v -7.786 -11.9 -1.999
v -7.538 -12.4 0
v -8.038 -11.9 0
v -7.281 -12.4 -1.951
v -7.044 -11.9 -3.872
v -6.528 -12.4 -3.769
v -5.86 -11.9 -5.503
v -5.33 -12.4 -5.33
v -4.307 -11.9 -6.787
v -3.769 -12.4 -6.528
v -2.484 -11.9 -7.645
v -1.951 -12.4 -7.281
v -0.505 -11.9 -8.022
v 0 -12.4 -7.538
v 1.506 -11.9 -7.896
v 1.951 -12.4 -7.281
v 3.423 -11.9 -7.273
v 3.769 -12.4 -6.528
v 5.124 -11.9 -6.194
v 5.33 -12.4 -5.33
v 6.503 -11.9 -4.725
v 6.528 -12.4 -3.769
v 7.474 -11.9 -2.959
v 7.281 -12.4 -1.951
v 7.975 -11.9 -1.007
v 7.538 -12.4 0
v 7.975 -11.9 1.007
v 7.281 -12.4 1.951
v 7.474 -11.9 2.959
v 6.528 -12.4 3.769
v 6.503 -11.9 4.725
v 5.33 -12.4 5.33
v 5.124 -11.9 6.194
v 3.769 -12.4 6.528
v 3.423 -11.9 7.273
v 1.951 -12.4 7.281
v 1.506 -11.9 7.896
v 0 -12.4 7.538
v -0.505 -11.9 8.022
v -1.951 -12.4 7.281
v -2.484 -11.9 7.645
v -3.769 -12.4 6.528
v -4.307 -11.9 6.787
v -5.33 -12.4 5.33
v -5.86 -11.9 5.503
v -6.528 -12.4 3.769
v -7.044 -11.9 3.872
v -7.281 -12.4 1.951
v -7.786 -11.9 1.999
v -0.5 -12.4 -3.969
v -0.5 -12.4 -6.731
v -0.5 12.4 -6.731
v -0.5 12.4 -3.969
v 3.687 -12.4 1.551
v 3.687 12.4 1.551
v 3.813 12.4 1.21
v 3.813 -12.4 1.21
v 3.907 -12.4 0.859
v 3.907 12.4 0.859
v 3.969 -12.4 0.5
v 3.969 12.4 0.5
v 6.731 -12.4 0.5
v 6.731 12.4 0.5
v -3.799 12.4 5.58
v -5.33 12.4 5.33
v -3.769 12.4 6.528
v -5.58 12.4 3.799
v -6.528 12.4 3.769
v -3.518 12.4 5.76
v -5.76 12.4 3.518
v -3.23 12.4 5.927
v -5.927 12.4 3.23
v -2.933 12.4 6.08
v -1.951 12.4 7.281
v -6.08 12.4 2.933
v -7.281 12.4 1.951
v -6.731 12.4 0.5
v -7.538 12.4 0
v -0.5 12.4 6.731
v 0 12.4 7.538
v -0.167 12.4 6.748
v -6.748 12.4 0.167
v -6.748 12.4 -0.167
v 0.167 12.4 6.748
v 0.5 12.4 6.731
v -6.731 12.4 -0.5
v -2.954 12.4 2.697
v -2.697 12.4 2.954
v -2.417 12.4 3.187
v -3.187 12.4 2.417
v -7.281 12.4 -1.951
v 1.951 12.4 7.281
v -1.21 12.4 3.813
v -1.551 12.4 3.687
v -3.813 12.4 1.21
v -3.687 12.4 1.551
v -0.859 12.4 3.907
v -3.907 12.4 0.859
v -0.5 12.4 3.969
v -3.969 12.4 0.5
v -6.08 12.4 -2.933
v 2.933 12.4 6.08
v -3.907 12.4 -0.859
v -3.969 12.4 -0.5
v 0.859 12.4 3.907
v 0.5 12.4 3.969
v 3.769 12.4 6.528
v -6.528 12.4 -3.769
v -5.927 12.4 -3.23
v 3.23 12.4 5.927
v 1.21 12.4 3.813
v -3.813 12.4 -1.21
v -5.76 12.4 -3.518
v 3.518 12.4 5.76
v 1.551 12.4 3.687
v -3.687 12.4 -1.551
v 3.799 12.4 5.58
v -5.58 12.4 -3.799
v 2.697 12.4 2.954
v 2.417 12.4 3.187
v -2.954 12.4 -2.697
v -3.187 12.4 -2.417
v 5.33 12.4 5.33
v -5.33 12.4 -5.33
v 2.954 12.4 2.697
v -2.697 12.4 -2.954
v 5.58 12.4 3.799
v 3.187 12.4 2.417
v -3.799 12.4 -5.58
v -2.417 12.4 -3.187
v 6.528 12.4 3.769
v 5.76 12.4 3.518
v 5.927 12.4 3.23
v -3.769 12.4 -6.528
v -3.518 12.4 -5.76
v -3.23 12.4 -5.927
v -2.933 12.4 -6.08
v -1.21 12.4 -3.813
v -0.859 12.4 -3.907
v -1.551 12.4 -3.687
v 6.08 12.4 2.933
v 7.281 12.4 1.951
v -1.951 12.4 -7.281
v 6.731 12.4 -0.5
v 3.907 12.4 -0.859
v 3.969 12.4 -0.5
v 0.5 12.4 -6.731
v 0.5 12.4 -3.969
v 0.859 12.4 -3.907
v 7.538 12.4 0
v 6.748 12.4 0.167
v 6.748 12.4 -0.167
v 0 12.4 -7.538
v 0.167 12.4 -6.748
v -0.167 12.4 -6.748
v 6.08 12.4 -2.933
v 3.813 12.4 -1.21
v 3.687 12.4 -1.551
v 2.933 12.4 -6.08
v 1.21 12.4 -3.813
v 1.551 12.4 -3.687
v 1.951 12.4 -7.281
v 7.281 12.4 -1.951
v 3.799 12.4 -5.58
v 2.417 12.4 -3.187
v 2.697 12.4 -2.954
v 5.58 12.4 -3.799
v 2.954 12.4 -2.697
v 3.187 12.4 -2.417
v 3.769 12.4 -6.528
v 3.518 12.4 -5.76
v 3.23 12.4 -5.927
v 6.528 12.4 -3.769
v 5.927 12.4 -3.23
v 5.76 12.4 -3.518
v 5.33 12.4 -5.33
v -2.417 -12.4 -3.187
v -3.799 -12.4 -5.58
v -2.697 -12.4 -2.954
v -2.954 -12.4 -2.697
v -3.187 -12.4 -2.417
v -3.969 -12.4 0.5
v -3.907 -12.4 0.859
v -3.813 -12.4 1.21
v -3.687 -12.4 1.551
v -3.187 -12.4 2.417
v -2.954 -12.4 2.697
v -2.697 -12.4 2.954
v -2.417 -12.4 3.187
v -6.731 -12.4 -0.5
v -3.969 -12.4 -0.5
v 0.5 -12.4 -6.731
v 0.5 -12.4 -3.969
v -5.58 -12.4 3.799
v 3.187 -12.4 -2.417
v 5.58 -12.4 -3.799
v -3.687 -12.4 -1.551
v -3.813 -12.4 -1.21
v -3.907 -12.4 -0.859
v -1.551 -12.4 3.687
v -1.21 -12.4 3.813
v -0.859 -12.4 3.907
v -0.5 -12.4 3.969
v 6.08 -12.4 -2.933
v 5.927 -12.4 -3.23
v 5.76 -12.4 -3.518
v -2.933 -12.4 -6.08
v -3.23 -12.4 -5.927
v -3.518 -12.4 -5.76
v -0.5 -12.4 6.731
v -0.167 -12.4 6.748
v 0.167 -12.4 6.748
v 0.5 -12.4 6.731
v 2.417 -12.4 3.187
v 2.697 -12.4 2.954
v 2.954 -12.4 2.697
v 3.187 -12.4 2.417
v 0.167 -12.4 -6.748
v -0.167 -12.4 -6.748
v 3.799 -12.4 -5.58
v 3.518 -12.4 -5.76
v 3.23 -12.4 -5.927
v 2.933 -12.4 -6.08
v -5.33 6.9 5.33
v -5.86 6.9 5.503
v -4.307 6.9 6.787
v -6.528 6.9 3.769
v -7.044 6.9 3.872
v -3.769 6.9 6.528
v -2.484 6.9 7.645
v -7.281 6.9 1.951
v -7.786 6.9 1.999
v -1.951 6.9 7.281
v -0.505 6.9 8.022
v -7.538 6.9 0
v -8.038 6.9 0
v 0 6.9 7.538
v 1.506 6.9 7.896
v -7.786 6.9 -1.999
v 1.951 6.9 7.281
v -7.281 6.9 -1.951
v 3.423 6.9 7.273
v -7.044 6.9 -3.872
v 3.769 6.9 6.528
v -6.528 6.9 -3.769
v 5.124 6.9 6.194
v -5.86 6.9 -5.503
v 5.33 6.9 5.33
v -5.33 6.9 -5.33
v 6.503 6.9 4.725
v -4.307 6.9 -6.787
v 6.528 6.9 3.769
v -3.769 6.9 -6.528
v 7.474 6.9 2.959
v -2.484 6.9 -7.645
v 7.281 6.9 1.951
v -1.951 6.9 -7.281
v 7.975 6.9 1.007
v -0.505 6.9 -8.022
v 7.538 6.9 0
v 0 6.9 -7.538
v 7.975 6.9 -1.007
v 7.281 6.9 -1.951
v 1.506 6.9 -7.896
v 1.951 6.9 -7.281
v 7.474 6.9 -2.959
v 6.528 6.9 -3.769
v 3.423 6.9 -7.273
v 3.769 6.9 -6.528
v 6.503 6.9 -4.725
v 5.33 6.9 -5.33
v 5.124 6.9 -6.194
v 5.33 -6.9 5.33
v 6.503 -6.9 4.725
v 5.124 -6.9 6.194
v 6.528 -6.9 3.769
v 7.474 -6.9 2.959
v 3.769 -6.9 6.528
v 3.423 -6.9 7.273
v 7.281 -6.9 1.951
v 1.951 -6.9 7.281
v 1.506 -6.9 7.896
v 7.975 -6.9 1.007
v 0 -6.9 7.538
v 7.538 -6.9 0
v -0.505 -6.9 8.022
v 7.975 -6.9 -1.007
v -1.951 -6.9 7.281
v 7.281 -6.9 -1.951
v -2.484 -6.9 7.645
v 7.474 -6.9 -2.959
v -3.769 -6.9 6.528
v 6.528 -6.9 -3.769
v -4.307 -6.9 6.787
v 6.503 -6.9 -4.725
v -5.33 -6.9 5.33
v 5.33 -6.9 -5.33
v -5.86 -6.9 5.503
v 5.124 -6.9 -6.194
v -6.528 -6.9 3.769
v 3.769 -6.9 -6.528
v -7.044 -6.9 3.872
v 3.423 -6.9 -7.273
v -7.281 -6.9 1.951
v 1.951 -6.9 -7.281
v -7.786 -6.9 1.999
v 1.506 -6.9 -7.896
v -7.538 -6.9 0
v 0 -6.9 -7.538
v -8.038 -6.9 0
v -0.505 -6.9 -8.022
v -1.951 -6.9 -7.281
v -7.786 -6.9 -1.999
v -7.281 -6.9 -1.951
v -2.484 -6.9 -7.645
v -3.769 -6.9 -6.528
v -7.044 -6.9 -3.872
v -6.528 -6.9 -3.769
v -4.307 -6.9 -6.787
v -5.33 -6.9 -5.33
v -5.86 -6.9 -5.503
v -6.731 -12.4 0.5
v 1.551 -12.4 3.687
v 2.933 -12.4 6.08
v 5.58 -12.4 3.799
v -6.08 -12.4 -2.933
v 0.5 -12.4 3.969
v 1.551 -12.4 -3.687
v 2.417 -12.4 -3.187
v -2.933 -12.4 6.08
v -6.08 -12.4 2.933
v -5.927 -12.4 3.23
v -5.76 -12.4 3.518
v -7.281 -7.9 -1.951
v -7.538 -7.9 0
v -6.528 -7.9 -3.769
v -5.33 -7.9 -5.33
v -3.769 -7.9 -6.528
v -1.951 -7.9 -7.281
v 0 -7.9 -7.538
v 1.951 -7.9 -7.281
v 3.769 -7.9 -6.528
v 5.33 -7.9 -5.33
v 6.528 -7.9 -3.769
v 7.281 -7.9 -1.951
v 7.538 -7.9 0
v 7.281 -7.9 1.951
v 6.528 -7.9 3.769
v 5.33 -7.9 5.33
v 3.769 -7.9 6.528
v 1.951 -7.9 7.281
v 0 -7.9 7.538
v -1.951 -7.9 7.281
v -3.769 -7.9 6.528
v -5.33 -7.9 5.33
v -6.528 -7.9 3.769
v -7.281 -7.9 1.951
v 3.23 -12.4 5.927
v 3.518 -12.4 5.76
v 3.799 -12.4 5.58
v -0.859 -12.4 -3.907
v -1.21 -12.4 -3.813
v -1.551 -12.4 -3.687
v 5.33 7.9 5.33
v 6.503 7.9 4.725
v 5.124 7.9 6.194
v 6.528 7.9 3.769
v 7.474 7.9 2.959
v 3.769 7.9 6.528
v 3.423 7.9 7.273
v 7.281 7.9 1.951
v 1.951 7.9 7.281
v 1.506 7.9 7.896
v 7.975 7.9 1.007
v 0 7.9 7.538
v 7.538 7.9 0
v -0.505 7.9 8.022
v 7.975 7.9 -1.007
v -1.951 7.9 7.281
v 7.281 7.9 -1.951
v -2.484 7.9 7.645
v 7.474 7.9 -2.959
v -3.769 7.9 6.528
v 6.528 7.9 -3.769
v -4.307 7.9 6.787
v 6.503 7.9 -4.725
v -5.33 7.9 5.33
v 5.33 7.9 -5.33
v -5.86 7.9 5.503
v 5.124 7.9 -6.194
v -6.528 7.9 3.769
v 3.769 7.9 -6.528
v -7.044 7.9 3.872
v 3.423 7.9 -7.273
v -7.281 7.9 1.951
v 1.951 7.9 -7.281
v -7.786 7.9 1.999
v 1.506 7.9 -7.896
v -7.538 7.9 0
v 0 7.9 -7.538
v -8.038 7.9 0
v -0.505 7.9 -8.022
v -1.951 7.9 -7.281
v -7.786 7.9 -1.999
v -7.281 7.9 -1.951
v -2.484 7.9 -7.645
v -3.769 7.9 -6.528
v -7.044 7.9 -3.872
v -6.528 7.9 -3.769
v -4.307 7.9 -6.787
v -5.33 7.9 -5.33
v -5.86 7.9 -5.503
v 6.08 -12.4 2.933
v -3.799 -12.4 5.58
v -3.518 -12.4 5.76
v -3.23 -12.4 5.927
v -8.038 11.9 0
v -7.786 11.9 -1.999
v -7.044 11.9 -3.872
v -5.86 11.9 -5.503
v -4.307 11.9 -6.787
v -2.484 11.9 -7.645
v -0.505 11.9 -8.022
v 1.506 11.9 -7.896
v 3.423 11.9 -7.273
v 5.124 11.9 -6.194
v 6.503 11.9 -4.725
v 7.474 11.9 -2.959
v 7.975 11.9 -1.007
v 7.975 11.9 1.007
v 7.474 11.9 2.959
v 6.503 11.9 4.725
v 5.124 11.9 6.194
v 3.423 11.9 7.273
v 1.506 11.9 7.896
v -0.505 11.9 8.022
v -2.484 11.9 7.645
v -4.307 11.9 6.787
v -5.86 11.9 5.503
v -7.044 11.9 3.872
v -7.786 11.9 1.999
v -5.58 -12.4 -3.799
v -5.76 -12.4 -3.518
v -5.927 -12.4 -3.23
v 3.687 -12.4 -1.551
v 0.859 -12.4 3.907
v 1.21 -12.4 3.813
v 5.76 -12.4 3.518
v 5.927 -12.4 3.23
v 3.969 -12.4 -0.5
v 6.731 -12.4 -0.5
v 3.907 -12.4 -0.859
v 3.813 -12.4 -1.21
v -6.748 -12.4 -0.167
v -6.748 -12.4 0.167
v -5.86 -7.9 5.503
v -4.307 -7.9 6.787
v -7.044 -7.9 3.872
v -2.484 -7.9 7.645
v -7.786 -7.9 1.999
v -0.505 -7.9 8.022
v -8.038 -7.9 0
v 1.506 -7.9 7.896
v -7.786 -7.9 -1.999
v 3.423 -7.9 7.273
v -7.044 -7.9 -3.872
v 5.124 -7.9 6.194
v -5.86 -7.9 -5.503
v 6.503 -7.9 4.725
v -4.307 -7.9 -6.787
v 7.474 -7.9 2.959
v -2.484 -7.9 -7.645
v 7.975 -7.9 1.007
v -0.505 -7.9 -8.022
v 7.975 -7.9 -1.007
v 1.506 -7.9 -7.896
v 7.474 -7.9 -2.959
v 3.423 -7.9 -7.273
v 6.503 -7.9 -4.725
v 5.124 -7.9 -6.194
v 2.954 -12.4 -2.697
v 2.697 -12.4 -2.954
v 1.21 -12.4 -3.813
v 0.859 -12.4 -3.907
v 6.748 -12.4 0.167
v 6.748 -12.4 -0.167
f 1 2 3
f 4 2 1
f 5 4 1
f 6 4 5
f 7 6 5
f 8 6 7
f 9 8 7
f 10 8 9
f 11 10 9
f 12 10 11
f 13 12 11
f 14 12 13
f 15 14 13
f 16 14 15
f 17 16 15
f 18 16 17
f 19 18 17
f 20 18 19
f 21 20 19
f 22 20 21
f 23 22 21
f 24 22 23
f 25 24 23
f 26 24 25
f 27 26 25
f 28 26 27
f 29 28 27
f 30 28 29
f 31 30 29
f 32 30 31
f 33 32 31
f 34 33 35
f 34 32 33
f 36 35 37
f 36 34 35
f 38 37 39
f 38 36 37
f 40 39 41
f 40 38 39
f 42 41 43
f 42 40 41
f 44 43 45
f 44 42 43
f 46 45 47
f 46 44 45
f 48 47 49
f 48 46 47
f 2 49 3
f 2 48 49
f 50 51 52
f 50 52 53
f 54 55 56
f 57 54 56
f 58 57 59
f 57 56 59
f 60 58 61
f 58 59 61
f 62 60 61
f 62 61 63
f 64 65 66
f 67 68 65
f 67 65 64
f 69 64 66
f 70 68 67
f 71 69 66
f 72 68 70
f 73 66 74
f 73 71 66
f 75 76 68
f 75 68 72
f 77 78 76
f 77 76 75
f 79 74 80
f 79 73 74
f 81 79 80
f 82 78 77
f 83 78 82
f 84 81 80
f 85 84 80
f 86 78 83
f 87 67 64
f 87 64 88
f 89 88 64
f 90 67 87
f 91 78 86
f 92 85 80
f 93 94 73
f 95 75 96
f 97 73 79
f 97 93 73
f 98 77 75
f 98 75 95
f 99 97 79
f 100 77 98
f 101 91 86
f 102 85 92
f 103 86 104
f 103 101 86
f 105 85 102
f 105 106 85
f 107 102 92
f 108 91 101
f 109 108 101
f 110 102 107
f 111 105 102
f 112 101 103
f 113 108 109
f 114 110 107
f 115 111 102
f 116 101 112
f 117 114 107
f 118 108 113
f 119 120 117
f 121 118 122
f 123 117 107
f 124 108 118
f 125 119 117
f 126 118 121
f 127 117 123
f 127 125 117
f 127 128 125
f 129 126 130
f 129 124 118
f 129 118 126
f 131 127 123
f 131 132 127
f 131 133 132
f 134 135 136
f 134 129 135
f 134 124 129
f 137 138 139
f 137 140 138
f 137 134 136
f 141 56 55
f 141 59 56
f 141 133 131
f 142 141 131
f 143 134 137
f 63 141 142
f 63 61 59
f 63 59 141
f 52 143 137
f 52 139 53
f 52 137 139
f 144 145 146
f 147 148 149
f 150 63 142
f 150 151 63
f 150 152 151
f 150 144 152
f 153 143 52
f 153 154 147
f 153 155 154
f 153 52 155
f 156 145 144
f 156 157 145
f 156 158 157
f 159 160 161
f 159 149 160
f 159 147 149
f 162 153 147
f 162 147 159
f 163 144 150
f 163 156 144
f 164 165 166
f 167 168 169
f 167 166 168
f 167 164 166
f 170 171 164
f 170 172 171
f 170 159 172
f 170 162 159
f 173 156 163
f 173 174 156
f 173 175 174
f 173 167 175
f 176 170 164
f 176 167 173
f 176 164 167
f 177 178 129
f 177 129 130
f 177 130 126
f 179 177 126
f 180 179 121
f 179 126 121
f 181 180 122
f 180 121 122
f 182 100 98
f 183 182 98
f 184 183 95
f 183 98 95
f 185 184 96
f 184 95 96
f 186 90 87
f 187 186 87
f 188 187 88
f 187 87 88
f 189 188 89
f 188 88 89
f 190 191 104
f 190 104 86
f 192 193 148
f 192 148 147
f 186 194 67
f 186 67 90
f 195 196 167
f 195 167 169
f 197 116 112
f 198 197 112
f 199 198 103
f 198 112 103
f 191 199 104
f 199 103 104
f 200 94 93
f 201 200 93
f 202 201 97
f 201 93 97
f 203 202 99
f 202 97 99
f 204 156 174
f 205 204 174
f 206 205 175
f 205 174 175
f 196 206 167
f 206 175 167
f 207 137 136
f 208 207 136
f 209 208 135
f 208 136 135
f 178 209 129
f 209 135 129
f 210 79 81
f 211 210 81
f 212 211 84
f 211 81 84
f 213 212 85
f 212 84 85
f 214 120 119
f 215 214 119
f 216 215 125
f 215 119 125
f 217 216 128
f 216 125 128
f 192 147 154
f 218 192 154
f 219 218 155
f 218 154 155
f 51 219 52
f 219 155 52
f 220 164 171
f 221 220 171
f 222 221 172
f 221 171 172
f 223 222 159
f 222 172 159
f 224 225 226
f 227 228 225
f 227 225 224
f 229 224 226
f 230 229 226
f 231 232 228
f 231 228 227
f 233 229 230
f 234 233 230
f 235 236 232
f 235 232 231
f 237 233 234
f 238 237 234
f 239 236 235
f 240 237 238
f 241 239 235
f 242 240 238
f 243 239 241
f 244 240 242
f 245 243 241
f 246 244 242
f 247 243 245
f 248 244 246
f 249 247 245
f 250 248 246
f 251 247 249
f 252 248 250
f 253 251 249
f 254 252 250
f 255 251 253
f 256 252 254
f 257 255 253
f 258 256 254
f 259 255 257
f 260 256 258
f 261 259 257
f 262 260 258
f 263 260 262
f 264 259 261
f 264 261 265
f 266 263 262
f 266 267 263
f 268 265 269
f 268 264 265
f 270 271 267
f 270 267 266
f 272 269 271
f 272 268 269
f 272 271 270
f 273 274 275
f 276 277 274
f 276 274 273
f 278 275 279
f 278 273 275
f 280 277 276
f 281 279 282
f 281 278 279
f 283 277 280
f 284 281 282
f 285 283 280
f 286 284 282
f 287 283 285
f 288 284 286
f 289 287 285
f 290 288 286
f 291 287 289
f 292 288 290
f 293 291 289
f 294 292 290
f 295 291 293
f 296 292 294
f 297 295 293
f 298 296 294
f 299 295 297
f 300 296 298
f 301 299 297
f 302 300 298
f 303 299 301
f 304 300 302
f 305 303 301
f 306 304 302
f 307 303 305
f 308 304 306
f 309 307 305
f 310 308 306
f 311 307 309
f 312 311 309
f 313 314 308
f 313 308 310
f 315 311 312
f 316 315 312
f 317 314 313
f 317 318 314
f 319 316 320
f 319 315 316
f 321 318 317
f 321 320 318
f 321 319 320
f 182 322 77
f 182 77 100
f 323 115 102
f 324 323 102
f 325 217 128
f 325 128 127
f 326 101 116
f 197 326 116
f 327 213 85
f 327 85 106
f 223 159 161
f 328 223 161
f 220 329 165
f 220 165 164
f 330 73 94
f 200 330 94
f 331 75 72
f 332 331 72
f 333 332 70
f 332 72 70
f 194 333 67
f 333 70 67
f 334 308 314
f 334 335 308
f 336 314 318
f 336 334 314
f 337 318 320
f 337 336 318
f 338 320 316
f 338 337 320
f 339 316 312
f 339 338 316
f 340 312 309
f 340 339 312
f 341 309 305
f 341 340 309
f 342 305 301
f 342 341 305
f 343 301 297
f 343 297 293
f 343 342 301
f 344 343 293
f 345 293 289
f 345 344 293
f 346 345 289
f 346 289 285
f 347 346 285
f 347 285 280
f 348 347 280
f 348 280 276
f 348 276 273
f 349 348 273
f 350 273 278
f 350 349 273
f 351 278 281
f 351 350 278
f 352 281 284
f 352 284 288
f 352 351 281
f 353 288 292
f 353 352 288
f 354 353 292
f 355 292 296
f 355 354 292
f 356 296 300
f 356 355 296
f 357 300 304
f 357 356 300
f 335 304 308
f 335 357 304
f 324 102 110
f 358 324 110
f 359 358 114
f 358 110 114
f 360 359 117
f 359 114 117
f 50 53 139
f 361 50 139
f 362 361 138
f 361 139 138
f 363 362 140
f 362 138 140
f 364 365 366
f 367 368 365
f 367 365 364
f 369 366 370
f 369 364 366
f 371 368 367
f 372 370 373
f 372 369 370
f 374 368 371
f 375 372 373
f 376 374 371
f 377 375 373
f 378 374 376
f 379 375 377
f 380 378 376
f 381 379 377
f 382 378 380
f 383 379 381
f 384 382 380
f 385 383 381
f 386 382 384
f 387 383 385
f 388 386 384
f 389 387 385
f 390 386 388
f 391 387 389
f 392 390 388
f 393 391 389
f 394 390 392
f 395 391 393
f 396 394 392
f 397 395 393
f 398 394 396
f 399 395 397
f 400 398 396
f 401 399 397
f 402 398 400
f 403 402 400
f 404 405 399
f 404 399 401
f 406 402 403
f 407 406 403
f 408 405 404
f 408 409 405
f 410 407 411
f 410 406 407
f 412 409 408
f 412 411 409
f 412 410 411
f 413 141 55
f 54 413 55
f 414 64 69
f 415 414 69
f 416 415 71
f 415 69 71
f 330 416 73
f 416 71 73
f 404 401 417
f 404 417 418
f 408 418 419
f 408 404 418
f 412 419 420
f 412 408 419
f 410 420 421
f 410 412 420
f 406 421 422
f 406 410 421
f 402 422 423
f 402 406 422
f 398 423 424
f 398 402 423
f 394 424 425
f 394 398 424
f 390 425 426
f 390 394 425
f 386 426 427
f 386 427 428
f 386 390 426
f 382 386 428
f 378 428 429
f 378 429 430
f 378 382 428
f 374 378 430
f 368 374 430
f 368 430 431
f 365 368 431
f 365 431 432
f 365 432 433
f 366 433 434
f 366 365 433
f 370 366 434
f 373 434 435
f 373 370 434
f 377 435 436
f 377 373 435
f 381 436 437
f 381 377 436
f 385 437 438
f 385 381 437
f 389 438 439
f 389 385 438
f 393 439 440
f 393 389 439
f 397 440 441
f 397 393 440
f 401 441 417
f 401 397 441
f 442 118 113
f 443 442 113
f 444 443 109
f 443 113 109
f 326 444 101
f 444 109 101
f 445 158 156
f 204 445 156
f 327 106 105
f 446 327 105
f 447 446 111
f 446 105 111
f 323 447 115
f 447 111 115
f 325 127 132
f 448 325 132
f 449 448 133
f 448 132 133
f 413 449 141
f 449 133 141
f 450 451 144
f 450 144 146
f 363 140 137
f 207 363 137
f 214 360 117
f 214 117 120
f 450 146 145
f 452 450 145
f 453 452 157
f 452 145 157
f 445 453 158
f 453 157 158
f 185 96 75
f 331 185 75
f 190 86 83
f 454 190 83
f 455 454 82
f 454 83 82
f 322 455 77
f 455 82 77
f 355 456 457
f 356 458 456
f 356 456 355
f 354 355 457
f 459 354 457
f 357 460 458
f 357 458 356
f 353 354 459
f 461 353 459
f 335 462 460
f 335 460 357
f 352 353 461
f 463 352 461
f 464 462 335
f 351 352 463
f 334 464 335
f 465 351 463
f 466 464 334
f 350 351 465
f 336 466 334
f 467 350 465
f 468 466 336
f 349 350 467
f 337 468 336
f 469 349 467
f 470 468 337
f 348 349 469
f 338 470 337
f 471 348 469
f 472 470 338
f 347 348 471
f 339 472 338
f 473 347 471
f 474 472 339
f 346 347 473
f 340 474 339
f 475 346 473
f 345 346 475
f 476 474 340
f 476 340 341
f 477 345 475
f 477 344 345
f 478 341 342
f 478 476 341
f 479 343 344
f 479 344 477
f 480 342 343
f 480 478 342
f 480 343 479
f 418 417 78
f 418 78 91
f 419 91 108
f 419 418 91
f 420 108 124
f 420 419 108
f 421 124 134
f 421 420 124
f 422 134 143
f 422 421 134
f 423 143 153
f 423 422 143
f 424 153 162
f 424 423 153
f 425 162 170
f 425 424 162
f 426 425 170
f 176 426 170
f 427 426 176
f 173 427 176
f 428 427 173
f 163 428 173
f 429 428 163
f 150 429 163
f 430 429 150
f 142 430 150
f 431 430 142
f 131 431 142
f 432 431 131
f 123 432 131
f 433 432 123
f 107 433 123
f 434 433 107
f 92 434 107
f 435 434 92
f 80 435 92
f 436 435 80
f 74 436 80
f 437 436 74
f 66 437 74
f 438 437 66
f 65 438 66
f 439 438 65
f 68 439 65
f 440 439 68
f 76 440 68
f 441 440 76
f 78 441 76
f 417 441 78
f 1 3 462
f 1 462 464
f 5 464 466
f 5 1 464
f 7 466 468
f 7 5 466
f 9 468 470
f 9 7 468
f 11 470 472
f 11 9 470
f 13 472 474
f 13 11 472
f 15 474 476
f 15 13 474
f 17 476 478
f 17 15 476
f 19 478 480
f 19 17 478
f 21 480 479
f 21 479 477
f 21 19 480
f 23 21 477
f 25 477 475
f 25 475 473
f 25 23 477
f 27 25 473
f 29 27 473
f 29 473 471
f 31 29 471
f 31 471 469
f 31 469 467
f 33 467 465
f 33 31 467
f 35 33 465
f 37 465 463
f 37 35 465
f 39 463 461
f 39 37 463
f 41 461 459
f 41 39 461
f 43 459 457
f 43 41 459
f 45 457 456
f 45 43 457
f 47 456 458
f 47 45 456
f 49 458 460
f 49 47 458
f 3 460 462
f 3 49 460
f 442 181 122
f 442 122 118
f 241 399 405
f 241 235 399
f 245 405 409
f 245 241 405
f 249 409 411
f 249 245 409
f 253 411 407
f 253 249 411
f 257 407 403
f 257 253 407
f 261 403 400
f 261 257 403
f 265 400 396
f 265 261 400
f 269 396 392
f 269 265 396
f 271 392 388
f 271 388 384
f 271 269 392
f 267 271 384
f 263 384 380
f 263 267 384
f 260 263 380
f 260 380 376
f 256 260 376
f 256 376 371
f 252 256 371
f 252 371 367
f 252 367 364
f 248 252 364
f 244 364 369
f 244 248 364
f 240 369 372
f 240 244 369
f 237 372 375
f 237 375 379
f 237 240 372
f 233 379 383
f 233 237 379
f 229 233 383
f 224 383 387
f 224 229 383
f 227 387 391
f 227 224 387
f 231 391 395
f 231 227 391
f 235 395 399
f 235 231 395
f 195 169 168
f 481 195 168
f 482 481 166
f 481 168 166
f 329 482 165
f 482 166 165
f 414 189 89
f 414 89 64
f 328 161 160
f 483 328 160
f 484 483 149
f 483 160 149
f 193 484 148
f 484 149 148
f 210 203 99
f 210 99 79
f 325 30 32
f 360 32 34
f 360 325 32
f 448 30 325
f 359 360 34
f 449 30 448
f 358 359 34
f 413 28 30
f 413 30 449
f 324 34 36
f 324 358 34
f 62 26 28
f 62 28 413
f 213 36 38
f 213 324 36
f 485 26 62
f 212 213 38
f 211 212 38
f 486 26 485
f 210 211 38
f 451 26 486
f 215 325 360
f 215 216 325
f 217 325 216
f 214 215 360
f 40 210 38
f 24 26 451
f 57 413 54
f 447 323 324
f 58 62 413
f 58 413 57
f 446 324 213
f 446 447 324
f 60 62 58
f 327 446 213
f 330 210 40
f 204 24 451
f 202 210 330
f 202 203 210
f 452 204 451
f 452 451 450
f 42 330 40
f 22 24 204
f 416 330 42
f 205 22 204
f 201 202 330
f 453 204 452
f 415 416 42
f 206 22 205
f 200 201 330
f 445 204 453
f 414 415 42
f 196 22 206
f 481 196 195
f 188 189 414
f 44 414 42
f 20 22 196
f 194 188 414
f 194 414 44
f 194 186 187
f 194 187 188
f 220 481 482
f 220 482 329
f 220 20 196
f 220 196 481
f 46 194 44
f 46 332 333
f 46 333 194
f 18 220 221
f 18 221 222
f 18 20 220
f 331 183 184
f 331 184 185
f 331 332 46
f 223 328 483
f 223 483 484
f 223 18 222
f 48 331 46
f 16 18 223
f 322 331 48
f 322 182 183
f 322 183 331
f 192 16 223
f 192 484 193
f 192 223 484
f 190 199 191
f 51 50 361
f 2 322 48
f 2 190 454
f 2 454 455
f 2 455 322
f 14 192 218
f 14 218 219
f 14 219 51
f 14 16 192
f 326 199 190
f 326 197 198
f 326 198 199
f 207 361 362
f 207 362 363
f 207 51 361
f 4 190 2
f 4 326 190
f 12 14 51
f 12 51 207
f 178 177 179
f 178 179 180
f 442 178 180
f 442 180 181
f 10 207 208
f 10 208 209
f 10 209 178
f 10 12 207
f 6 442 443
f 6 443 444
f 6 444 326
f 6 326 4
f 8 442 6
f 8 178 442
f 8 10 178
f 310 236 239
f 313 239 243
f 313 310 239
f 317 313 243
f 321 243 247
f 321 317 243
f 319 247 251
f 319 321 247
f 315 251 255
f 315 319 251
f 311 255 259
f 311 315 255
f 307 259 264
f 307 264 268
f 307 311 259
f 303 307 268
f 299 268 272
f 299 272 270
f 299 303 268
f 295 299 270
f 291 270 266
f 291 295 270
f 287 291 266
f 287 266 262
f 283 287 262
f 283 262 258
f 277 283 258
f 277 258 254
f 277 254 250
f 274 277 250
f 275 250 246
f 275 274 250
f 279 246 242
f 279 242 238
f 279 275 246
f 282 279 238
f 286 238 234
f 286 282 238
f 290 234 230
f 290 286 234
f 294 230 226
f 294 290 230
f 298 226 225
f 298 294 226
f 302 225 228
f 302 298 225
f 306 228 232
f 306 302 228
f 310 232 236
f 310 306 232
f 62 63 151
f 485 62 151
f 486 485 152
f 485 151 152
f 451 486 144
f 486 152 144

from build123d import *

# Parameters (mm, degrees)
CHANFREIN1_SIZE         = 0.5
ENL_V_MAT_EXTRU_1_DEPTH = 25.8


with BuildPart() as part:
    # Esquisse2 → Révolution1 (revolve)
    with BuildSketch(Plane.XY):
        Polygon((0, 12.4), (-8.03826441, 12.4), (-8.03826441, 7.9), (-7.53826441, 7.9), (-7.53826441, 6.9), (-8.03826441, 6.9), (-8.03826441, -6.9), (-7.53826441, -6.9), (-7.53826441, -7.9), (-8.03826441, -7.9), (-8.03826441, -12.4), (0, -12.4), align=None)
    revolve(axis=Axis((0, 0, 0), (0, -1, 0)))

    # Chanfrein1
    chanfrein1_edges = [part.edges().sort_by_distance(p)[0] for p in [
        (8.03826441, 12.4, 0),
        (8.03826441, -12.4, 0),
    ]]
    chamfer(chanfrein1_edges, length=CHANFREIN1_SIZE)

    # Esquisse3 → Enlèv. mat.-Extru.1 (cut, through all)
    with BuildSketch(Plane(origin=(0, 12.4, 0), x_dir=(1, 0, 0), z_dir=(0, 1, 0))):
        with BuildLine():
            Line((-0.5, 6.731456009), (-0.5, 3.968626967))
            ThreePointArc((-0.5, 3.968626967), (-1.03527618, 3.863703305), (-1.551300781, 3.686931771))
            Line((-1.551300781, 3.686931771), (-2.932715303, 6.079611908))
            ThreePointArc((-2.932715303, 6.079611908), (-3.375, 5.845671476), (-3.798740706, 5.579611908))
            Line((-3.798740706, 5.579611908), (-2.417326185, 3.186931771))
            ThreePointArc((-2.417326185, 3.186931771), (-2.828427125, 2.828427125), (-3.186931771, 2.417326185))
            Line((-3.186931771, 2.417326185), (-5.579611908, 3.798740706))
            ThreePointArc((-5.579611908, 3.798740706), (-5.845671476, 3.375), (-6.079611908, 2.932715303))
            Line((-6.079611908, 2.932715303), (-3.686931771, 1.551300781))
            ThreePointArc((-3.686931771, 1.551300781), (-3.863703305, 1.03527618), (-3.968626967, 0.5))
            Line((-3.968626967, 0.5), (-6.731456009, 0.5))
            ThreePointArc((-6.731456009, 0.5), (-6.75, 0), (-6.731456009, -0.5))
            Line((-6.731456009, -0.5), (-3.968626967, -0.5))
            ThreePointArc((-3.968626967, -0.5), (-3.863703305, -1.03527618), (-3.686931771, -1.551300781))
            Line((-3.686931771, -1.551300781), (-6.079611908, -2.932715303))
            ThreePointArc((-6.079611908, -2.932715303), (-5.845671476, -3.375), (-5.579611908, -3.798740706))
            Line((-5.579611908, -3.798740706), (-3.186931771, -2.417326185))
            ThreePointArc((-3.186931771, -2.417326185), (-2.828427125, -2.828427125), (-2.417326185, -3.186931771))
            Line((-2.417326185, -3.186931771), (-3.798740706, -5.579611908))
            ThreePointArc((-3.798740706, -5.579611908), (-3.375, -5.845671476), (-2.932715303, -6.079611908))
            Line((-2.932715303, -6.079611908), (-1.551300781, -3.686931771))
            ThreePointArc((-1.551300781, -3.686931771), (-1.03527618, -3.863703305), (-0.5, -3.968626967))
            Line((-0.5, -3.968626967), (-0.5, -6.731456009))
            ThreePointArc((-0.5, -6.731456009), (0, -6.75), (0.5, -6.731456009))
            Line((0.5, -6.731456009), (0.5, -3.968626967))
            ThreePointArc((0.5, -3.968626967), (1.03527618, -3.863703305), (1.551300781, -3.686931771))
            Line((1.551300781, -3.686931771), (2.932715303, -6.079611908))
            ThreePointArc((2.932715303, -6.079611908), (3.375, -5.845671476), (3.798740706, -5.579611908))
            Line((3.798740706, -5.579611908), (2.417326185, -3.186931771))
            ThreePointArc((2.417326185, -3.186931771), (2.828427125, -2.828427125), (3.186931771, -2.417326185))
            Line((3.186931771, -2.417326185), (5.579611908, -3.798740706))
            ThreePointArc((5.579611908, -3.798740706), (5.845671476, -3.375), (6.079611908, -2.932715303))
            Line((6.079611908, -2.932715303), (3.686931771, -1.551300781))
            ThreePointArc((3.686931771, -1.551300781), (3.863703305, -1.03527618), (3.968626967, -0.5))
            Line((3.968626967, -0.5), (6.731456009, -0.5))
            ThreePointArc((6.731456009, -0.5), (6.75, 0), (6.731456009, 0.5))
            Line((6.731456009, 0.5), (3.968626967, 0.5))
            ThreePointArc((3.968626967, 0.5), (3.863703305, 1.03527618), (3.686931771, 1.551300781))
            Line((3.686931771, 1.551300781), (6.079611908, 2.932715303))
            ThreePointArc((6.079611908, 2.932715303), (5.845671476, 3.375), (5.579611908, 3.798740706))
            Line((5.579611908, 3.798740706), (3.186931771, 2.417326185))
            ThreePointArc((3.186931771, 2.417326185), (2.828427125, 2.828427125), (2.417326185, 3.186931771))
            Line((2.417326185, 3.186931771), (3.798740706, 5.579611908))
            ThreePointArc((3.798740706, 5.579611908), (3.375, 5.845671476), (2.932715303, 6.079611908))
            Line((2.932715303, 6.079611908), (1.551300781, 3.686931771))
            ThreePointArc((1.551300781, 3.686931771), (1.03527618, 3.863703305), (0.5, 3.968626967))
            Line((0.5, 3.968626967), (0.5, 6.731456009))
            ThreePointArc((0.5, 6.731456009), (0, 6.75), (-0.5, 6.731456009))
        make_face()
    extrude(amount=-ENL_V_MAT_EXTRU_1_DEPTH, mode=Mode.SUBTRACT)


solid = part.part
